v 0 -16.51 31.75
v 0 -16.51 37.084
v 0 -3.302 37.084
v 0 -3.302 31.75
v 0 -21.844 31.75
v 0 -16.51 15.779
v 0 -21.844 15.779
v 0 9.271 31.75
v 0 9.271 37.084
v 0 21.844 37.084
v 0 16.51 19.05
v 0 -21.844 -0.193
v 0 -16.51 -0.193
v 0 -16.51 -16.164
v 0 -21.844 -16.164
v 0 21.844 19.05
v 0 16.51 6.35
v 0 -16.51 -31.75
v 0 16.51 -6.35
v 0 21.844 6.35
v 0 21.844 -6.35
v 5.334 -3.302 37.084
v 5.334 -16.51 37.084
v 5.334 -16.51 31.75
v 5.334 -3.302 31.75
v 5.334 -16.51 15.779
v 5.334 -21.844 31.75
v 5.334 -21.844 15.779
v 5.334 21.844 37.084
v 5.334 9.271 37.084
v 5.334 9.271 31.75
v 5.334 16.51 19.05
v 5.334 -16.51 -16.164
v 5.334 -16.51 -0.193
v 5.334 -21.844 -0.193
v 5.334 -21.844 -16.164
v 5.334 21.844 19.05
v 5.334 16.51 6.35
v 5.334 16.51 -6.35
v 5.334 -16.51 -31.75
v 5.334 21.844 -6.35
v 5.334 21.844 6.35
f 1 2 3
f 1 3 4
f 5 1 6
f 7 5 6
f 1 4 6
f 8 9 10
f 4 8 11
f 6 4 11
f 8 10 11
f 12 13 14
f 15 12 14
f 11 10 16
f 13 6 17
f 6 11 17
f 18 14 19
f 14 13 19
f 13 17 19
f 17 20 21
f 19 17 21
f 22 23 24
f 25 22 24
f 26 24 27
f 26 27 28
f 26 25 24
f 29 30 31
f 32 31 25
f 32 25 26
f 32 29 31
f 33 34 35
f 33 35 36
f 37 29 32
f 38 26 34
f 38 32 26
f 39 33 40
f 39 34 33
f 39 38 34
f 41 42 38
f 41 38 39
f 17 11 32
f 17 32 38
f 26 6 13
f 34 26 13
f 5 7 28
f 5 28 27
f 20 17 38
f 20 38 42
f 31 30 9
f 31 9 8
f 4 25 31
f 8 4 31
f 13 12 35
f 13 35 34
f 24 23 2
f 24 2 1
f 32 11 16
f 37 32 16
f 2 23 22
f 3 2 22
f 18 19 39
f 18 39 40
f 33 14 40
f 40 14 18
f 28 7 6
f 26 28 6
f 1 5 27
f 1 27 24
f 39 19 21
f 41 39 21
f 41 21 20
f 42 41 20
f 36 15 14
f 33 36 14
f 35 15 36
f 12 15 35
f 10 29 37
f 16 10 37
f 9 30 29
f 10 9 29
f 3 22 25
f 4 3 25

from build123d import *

# Parameters (mm, degrees)
SKETCH1_W            = 63.5
SKETCH1_H            = 33.02
BOSS_EXTRUDE1_DEPTH  = 5.334
CUT_EXTRUDE1_DEPTH   = 6.334
SKETCH3_W            = 12.7
SKETCH3_H            = 5.334
SKETCH3_W_2          = 15.971321783
BOSS_EXTRUDE2_DEPTH  = 5.334
SKETCH4_W            = 5.334
SKETCH4_H            = 37.084
BOSS_EXTRUDE7_DEPTH  = 5.334
SKETCH5_W            = 5.334
SKETCH5_H            = 12.573
CUT_EXTRUDE2_DEPTH   = 6.334
SKETCH6_W            = 5.334
SKETCH6_H            = 0.635
BOSS_EXTRUDE9_DEPTH  = 5.334
SKETCH7_W            = 5.334
SKETCH7_H            = 0.635
BOSS_EXTRUDE10_DEPTH = 5.334


with BuildPart() as part:
    # Sketch1 → Boss-Extrude1 (new body)
    with BuildSketch(Plane(origin=(0, 0, 0), x_dir=(0, 0, -1), z_dir=(1, 0, 0))):
        Rectangle(SKETCH1_W, SKETCH1_H)
    extrude(amount=BOSS_EXTRUDE1_DEPTH)

    # Sketch2 → Cut-Extrude1 (cut, through all)
    with BuildSketch(Plane.ZY):
        Polygon((-31.75, -16.51), (-31.75, 16.51), (-6.35, 16.51), align=None)
    extrude(amount=-CUT_EXTRUDE1_DEPTH, mode=Mode.SUBTRACT)

    # Sketch3 → Boss-Extrude2 (add, through all)
    with BuildSketch(Plane.ZY):
        with Locations((25.4, 19.177)):
            Rectangle(SKETCH3_W, SKETCH3_H)
        with Locations((0, 19.177)):
            Rectangle(SKETCH3_W, SKETCH3_H)
        with Locations((23.764339109, -19.177)):
            Rectangle(SKETCH3_W_2, SKETCH3_H)
        with Locations((-8.178304458, -19.177)):
            Rectangle(SKETCH3_W_2, SKETCH3_H)
    extrude(amount=-BOSS_EXTRUDE2_DEPTH)

    # Sketch4 → Boss-Extrude7 (add)
    with BuildSketch(Plane.ZY):
        with Locations((34.417, 2.667)):
            Rectangle(SKETCH4_W, SKETCH4_H)
    extrude(amount=-BOSS_EXTRUDE7_DEPTH)

    # Sketch5 → Cut-Extrude2 (cut, through all)
    with BuildSketch(Plane(origin=(5.334, 0, 0), x_dir=(0, 0, -1), z_dir=(1, 0, 0))):
        with Locations((-34.417, 2.9845)):
            Rectangle(SKETCH5_W, SKETCH5_H)
    extrude(amount=-CUT_EXTRUDE2_DEPTH, mode=Mode.SUBTRACT)

    # Sketch6 → Boss-Extrude9 (add)
    with BuildSketch(Plane(origin=(5.334, 0, 0), x_dir=(0, 0, -1), z_dir=(1, 0, 0))):
        with Locations((-34.417, 21.5265)):
            Rectangle(SKETCH6_W, SKETCH6_H)
    extrude(amount=-BOSS_EXTRUDE9_DEPTH)

    # Sketch7 → Boss-Extrude10 (add)
    with BuildSketch(Plane(origin=(5.334, 0, 0), x_dir=(0, 0, -1), z_dir=(1, 0, 0))):
        with Locations((-34.417, -16.1925)):
            Rectangle(SKETCH7_W, SKETCH7_H)
    extrude(amount=-BOSS_EXTRUDE10_DEPTH)


solid = part.part
